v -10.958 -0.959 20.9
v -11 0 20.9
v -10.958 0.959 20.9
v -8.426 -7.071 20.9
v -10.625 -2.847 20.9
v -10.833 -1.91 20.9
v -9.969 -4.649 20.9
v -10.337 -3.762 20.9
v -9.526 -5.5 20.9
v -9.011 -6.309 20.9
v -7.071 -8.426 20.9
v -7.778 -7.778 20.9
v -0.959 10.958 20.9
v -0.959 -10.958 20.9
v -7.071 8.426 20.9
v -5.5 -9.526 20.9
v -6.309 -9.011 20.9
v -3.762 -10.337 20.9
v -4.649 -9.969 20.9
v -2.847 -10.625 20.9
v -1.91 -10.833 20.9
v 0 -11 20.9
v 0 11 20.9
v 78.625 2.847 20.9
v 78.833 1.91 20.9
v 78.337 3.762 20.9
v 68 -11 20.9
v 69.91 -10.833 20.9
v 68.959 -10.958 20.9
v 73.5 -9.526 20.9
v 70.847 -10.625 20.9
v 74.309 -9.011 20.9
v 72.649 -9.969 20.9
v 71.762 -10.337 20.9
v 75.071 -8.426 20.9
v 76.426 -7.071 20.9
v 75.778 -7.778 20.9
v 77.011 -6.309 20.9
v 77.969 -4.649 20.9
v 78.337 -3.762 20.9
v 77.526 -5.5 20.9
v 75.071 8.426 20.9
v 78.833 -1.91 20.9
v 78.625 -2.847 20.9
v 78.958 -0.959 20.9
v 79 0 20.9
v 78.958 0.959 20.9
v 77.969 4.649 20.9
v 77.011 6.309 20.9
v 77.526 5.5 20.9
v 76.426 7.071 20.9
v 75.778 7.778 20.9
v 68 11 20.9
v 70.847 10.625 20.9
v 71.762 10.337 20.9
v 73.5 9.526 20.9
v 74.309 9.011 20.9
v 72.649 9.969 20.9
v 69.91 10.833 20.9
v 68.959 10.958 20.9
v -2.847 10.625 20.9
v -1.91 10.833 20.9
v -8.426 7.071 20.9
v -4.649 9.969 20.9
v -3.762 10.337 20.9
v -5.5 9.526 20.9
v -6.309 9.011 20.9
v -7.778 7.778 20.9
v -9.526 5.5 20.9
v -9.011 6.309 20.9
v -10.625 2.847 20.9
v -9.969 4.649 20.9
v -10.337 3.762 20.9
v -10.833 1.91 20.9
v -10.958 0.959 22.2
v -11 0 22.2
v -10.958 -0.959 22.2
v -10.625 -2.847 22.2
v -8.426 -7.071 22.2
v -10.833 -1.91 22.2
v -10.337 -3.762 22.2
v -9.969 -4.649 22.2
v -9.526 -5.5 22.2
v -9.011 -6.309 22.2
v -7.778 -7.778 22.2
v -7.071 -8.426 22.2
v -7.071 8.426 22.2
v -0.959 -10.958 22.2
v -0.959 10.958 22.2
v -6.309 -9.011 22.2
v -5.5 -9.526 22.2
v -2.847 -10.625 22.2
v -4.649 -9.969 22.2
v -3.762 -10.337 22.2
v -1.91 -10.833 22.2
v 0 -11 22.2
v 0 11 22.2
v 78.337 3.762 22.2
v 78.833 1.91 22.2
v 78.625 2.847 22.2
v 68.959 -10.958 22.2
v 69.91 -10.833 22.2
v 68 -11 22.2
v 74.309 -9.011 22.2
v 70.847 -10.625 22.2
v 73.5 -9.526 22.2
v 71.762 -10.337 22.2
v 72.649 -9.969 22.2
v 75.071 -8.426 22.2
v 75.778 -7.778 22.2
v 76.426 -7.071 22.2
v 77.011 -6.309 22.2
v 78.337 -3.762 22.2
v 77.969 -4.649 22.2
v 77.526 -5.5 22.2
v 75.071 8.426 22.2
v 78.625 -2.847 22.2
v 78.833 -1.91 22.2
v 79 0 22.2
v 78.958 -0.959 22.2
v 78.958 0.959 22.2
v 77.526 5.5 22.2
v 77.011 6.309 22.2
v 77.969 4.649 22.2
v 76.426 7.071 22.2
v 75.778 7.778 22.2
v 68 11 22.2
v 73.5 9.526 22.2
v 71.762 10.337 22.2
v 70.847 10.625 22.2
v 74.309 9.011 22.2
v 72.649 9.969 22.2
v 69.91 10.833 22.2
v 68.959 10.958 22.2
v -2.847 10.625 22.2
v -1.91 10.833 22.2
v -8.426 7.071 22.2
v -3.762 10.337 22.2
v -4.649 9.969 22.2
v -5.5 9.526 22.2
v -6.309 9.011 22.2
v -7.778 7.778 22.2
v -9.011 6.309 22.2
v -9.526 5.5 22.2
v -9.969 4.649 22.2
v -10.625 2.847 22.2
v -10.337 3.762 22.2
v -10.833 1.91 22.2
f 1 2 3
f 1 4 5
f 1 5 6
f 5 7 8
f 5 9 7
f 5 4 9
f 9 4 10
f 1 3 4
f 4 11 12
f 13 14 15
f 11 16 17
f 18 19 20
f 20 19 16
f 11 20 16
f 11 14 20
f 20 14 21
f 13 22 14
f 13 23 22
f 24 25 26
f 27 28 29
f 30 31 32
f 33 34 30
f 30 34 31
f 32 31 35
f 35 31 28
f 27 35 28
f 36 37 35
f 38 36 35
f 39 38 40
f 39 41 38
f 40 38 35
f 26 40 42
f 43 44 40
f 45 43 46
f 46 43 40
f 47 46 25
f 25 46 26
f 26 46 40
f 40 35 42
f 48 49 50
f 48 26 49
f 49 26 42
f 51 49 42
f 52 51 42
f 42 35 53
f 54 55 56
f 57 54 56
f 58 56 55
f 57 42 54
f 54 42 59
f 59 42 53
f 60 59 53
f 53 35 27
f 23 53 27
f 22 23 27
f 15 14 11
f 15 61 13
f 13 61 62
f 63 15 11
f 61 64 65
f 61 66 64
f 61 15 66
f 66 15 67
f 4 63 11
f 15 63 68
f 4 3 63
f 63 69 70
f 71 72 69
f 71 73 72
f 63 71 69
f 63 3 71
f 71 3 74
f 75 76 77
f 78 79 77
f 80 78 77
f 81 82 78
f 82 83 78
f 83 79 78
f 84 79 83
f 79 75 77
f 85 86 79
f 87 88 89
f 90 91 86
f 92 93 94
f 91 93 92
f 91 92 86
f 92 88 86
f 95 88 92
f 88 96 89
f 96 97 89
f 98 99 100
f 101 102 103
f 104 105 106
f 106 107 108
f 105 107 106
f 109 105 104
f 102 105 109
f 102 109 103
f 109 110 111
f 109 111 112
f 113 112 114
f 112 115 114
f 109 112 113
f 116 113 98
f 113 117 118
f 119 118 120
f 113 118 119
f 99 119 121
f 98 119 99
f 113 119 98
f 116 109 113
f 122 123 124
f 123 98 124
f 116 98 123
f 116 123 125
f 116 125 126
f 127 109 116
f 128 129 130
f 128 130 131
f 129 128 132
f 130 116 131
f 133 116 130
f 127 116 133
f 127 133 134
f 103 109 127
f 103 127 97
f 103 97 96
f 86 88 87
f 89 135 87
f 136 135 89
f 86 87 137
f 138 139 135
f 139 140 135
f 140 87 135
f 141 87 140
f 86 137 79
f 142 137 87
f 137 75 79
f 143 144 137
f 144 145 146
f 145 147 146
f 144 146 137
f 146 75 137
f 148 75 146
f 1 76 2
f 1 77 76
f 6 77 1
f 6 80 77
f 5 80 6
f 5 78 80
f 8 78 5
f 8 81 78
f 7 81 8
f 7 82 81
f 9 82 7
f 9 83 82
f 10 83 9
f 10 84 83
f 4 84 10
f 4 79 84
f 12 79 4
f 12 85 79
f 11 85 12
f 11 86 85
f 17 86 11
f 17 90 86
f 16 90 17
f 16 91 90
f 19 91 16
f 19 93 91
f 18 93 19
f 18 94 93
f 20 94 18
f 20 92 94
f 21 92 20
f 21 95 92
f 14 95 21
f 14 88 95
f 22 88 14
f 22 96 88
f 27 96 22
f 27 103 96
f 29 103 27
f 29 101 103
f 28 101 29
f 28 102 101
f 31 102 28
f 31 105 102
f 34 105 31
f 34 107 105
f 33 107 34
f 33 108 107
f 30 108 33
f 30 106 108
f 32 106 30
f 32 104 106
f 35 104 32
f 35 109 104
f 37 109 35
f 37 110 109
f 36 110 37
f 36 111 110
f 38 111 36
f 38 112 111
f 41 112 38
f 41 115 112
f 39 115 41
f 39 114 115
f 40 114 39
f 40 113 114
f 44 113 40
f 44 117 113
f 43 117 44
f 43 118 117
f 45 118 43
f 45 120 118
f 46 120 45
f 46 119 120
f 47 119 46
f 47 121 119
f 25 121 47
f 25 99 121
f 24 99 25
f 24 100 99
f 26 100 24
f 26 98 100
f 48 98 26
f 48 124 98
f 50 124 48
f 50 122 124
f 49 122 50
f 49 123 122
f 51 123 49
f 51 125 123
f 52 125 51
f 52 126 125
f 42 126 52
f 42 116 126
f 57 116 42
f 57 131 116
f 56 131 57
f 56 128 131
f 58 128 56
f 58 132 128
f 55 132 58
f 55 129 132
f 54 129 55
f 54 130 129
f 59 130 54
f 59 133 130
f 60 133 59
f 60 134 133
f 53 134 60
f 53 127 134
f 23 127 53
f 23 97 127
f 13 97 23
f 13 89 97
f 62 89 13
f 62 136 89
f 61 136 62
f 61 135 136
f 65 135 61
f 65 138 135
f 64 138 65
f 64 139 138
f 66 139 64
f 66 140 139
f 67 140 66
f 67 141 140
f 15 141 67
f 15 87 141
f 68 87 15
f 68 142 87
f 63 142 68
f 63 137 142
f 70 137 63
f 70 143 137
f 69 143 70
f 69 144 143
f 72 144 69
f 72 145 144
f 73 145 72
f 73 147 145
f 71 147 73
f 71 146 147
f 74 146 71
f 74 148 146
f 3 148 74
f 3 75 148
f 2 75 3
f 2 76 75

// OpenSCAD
// file: ../testbox.scad
// ===== Straight 5-LED letter-stroke test box =====
// The A0 recipe (white reflector shell + integrated clear lens over an air gap) as a
// short straight stroke segment, at the bolt's pixel pitch. Purpose: try the
// INTEGRATED-lens path and see what fuzzy skin does on the lens face.
//
// PRINT AS-ORIENTED = plate on the bed, LENS UP. The lens top is the outer surface,
// so enable Fuzzy Skin on the clear part in the slicer. Pixels plug into the collars
// from the BOTTOM after printing. NO SUPPORTS: walls are vertical, and the clear lens
// is a ~18mm bridge anchored on both long walls (roof over the channel).
//
// Two-material: WHITE shell -> filament 1, CLEAR lens -> filament 2. Export both,
// combine with tools/make_3mf.py.

include <config.scad>
include <collar.scad>

tb_n      = 5;                      // number of pixels
tb_pitch  = 17;                    // bolt pixel pitch (mm)
tb_inner  = 18;                    // channel interior (= bolt); collar O16 fits
tb_wall   = 2;                     // white wall thickness
tb_outer  = tb_inner + 2*tb_wall; // 22mm outer
tb_gap    = 15;                    // LED-tip -> lens air gap (winning A0 value)
tb_wall_h = dome_clear + tb_gap;  // wall height above the plate (19mm)
tb_lens_t = 1.2;                  // clear lens thickness
tb_fuse   = 0.1;                  // white/clear overlap so the slicer fuses them

function tb_x(i) = i * tb_pitch;  // pixel x positions: 0 .. (n-1)*pitch

module tb_stroke(w) {             // straight stadium: rounded caps past the end pixels
    hull() { translate([tb_x(0),0]) circle(d=w); translate([tb_x(tb_n-1),0]) circle(d=w); }
}

module testbox_white() {          // plate + walls + collars (pixels plug in from below)
    difference() {
        union() {
            linear_extrude(plate_t) tb_stroke(tb_outer);
            translate([0,0,plate_t]) linear_extrude(tb_wall_h)
                difference() { tb_stroke(tb_outer); tb_stroke(tb_inner); }
        }
        for (i=[0:tb_n-1]) translate([tb_x(i),0,-0.1]) cylinder(h=plate_t+0.2, d=pixel_through);
    }
    for (i=[0:tb_n-1]) place_collar(tb_x(i), 0);
}

module testbox_clear() {          // integrated lens roof (bridges the channel), fuzzy-skin this
    translate([0,0,plate_t+tb_wall_h-tb_fuse])
        linear_extrude(tb_lens_t+tb_fuse) tb_stroke(tb_outer);
}
// file: ../collar.scad
// Calibrated press-fit collar, merged into the rear wall at each pixel.
// The STL is symmetric top/bottom (retention lip at mid-height), so insertion
// direction does not matter. Native STL sits X-centered at collar_cx, Z 0..collar_h.

module collar_solid() {
    translate([-collar_cx, 0, 0])
        import(collar_stl, convexity = 6);
}

module place_collar(x, y) {
    translate([x, y, 0]) collar_solid();
}
// file: ../config.scad
// ===== CHARGE LED sign — global config =====
// Edit this file; then run ./build.sh to regenerate every STL.

$fn = 72;

// ---- bullet pixel datasheet (measured + validated) ----
// dome Ø8, barrel Ø12, flange Ø13.6 x 2mm, dome-tip -> flange 5.5mm.
// Above the plate: ~Ø12 barrel for ~0.5mm, then the Ø8 dome to a tip ~dome_clear
// above the plate front. Drives pixel_through, dome_clear, and led_void clearances.

// ---- calibrated collar (press-fit for 12mm bullet pixel) ----
collar_stl    = "../../assets/bullet-collar.stl"; // path resolved from src/parts/ entry files
collar_h      = 2.0;     // Z span of the collar STL
collar_od     = 16.0;    // collar outer diameter
collar_cx     = 43.0;    // STL native X center (Y center is 0)
pixel_through = 12.3;    // clearance hole through the plate (just over bore Ø12.19)
dome_clear    = 4.0;     // dome protrusion above plate front. Spec: 5.5mm dome-tip-to-flange,
                         // flange seats on plate back, minus 2mm plate ~= 3.5-4mm. Seat a real
                         // pixel and measure to lock it in.

// ---- shell ----
plate_t    = 2.0;        // rear plate thickness (== collar_h, so the collar sits flush)
wall_t     = 2.5;        // chimney wall thickness
cell_inner = 30;         // square interior of each test cell (the press-fit opening)

// ---- diffuser panels (flat, drop-in — kept for the final glued option) ----
panel_press_clear = 0.25; // panel is this much SMALLER than the opening (total) -> friction fit
panel_thicks      = [1, 2, 3];

// ---- diffuser CAP (slides over an ISOLATED chimney; not used on touching rows) ----
cap_fit_clear = 0.4;   // skirt-inner minus chimney-outer (total); bigger = looser slide
cap_skirt_t   = 1.6;   // skirt wall thickness
cap_skirt_h   = 7;     // how far the skirt grips down over the chimney

// ---- diffuser LID = flanged plug (plug locates in the opening, flange catches on the rim) ----
lid_flange_cover = wall_t;  // flange overhang per side ~= wall width (rests on rim, can't fall in)
lid_flange_gap   = 0.3;     // shrink the flange a hair so neighbour lids don't clash
lid_plug_h       = 4;       // how far the plug drops into the opening (0 = plain flat tile)
lid_plug_clear   = 0.2;     // plug-outer = opening minus this (total) -> friction fit
                            // (was 0.5/loose; PETG plug in a PLA hole grips well at 0.2)
lid_plug_wall    = 1.5;     // plug-frame wall thickness

// ---- coupon depth ladder ----
led_gaps = [10, 15, 20]; // clear LED-tip -> diffuser distance, per cell (mm)
                         // (was [20,35,50] — 35/50 went too dim/washed; 20 is the new max)

// ---- collar v2: original bore + lip, plus a 45-deg lead-in chamfer ----
bore_face_r   = 6.10;    // collar bore radius at each face (~Ø12.2)
chamfer_depth = 0.5;     // axial depth of the 45-deg lead-in at each face
mouth_r       = bore_face_r + chamfer_depth;  // chamfer mouth radius (~Ø13.2)

// ---- collar A/B test harness ----
harness_w     = 52;      // tile width
harness_d     = 30;      // tile depth
harness_t     = plate_t; // match the real wall thickness for a faithful fit test
harness_pitch = 24;      // spacing between the two hole centers

// ---- derived ----
cell_pitch = cell_inner + 2 * wall_t;      // outer cell footprint (35)
n_cells    = len(led_gaps);
plate_w    = n_cells * cell_pitch;
plate_d    = cell_pitch;
panel_side = cell_inner - panel_press_clear;
function cell_x(i)     = i * cell_pitch + cell_pitch / 2;   // column center (distance)
function cell_y(j)     = j * cell_pitch + cell_pitch / 2;   // row center (for grid coupons)
function chimney_H(i)  = plate_t + dome_clear + led_gaps[i];
// main file
// CLEAR integrated lens roof of the test box (fuzzy-skin this, print lens-up). filament 2.
include <../config.scad>
include <../collar.scad>
include <../testbox.scad>
testbox_clear();
